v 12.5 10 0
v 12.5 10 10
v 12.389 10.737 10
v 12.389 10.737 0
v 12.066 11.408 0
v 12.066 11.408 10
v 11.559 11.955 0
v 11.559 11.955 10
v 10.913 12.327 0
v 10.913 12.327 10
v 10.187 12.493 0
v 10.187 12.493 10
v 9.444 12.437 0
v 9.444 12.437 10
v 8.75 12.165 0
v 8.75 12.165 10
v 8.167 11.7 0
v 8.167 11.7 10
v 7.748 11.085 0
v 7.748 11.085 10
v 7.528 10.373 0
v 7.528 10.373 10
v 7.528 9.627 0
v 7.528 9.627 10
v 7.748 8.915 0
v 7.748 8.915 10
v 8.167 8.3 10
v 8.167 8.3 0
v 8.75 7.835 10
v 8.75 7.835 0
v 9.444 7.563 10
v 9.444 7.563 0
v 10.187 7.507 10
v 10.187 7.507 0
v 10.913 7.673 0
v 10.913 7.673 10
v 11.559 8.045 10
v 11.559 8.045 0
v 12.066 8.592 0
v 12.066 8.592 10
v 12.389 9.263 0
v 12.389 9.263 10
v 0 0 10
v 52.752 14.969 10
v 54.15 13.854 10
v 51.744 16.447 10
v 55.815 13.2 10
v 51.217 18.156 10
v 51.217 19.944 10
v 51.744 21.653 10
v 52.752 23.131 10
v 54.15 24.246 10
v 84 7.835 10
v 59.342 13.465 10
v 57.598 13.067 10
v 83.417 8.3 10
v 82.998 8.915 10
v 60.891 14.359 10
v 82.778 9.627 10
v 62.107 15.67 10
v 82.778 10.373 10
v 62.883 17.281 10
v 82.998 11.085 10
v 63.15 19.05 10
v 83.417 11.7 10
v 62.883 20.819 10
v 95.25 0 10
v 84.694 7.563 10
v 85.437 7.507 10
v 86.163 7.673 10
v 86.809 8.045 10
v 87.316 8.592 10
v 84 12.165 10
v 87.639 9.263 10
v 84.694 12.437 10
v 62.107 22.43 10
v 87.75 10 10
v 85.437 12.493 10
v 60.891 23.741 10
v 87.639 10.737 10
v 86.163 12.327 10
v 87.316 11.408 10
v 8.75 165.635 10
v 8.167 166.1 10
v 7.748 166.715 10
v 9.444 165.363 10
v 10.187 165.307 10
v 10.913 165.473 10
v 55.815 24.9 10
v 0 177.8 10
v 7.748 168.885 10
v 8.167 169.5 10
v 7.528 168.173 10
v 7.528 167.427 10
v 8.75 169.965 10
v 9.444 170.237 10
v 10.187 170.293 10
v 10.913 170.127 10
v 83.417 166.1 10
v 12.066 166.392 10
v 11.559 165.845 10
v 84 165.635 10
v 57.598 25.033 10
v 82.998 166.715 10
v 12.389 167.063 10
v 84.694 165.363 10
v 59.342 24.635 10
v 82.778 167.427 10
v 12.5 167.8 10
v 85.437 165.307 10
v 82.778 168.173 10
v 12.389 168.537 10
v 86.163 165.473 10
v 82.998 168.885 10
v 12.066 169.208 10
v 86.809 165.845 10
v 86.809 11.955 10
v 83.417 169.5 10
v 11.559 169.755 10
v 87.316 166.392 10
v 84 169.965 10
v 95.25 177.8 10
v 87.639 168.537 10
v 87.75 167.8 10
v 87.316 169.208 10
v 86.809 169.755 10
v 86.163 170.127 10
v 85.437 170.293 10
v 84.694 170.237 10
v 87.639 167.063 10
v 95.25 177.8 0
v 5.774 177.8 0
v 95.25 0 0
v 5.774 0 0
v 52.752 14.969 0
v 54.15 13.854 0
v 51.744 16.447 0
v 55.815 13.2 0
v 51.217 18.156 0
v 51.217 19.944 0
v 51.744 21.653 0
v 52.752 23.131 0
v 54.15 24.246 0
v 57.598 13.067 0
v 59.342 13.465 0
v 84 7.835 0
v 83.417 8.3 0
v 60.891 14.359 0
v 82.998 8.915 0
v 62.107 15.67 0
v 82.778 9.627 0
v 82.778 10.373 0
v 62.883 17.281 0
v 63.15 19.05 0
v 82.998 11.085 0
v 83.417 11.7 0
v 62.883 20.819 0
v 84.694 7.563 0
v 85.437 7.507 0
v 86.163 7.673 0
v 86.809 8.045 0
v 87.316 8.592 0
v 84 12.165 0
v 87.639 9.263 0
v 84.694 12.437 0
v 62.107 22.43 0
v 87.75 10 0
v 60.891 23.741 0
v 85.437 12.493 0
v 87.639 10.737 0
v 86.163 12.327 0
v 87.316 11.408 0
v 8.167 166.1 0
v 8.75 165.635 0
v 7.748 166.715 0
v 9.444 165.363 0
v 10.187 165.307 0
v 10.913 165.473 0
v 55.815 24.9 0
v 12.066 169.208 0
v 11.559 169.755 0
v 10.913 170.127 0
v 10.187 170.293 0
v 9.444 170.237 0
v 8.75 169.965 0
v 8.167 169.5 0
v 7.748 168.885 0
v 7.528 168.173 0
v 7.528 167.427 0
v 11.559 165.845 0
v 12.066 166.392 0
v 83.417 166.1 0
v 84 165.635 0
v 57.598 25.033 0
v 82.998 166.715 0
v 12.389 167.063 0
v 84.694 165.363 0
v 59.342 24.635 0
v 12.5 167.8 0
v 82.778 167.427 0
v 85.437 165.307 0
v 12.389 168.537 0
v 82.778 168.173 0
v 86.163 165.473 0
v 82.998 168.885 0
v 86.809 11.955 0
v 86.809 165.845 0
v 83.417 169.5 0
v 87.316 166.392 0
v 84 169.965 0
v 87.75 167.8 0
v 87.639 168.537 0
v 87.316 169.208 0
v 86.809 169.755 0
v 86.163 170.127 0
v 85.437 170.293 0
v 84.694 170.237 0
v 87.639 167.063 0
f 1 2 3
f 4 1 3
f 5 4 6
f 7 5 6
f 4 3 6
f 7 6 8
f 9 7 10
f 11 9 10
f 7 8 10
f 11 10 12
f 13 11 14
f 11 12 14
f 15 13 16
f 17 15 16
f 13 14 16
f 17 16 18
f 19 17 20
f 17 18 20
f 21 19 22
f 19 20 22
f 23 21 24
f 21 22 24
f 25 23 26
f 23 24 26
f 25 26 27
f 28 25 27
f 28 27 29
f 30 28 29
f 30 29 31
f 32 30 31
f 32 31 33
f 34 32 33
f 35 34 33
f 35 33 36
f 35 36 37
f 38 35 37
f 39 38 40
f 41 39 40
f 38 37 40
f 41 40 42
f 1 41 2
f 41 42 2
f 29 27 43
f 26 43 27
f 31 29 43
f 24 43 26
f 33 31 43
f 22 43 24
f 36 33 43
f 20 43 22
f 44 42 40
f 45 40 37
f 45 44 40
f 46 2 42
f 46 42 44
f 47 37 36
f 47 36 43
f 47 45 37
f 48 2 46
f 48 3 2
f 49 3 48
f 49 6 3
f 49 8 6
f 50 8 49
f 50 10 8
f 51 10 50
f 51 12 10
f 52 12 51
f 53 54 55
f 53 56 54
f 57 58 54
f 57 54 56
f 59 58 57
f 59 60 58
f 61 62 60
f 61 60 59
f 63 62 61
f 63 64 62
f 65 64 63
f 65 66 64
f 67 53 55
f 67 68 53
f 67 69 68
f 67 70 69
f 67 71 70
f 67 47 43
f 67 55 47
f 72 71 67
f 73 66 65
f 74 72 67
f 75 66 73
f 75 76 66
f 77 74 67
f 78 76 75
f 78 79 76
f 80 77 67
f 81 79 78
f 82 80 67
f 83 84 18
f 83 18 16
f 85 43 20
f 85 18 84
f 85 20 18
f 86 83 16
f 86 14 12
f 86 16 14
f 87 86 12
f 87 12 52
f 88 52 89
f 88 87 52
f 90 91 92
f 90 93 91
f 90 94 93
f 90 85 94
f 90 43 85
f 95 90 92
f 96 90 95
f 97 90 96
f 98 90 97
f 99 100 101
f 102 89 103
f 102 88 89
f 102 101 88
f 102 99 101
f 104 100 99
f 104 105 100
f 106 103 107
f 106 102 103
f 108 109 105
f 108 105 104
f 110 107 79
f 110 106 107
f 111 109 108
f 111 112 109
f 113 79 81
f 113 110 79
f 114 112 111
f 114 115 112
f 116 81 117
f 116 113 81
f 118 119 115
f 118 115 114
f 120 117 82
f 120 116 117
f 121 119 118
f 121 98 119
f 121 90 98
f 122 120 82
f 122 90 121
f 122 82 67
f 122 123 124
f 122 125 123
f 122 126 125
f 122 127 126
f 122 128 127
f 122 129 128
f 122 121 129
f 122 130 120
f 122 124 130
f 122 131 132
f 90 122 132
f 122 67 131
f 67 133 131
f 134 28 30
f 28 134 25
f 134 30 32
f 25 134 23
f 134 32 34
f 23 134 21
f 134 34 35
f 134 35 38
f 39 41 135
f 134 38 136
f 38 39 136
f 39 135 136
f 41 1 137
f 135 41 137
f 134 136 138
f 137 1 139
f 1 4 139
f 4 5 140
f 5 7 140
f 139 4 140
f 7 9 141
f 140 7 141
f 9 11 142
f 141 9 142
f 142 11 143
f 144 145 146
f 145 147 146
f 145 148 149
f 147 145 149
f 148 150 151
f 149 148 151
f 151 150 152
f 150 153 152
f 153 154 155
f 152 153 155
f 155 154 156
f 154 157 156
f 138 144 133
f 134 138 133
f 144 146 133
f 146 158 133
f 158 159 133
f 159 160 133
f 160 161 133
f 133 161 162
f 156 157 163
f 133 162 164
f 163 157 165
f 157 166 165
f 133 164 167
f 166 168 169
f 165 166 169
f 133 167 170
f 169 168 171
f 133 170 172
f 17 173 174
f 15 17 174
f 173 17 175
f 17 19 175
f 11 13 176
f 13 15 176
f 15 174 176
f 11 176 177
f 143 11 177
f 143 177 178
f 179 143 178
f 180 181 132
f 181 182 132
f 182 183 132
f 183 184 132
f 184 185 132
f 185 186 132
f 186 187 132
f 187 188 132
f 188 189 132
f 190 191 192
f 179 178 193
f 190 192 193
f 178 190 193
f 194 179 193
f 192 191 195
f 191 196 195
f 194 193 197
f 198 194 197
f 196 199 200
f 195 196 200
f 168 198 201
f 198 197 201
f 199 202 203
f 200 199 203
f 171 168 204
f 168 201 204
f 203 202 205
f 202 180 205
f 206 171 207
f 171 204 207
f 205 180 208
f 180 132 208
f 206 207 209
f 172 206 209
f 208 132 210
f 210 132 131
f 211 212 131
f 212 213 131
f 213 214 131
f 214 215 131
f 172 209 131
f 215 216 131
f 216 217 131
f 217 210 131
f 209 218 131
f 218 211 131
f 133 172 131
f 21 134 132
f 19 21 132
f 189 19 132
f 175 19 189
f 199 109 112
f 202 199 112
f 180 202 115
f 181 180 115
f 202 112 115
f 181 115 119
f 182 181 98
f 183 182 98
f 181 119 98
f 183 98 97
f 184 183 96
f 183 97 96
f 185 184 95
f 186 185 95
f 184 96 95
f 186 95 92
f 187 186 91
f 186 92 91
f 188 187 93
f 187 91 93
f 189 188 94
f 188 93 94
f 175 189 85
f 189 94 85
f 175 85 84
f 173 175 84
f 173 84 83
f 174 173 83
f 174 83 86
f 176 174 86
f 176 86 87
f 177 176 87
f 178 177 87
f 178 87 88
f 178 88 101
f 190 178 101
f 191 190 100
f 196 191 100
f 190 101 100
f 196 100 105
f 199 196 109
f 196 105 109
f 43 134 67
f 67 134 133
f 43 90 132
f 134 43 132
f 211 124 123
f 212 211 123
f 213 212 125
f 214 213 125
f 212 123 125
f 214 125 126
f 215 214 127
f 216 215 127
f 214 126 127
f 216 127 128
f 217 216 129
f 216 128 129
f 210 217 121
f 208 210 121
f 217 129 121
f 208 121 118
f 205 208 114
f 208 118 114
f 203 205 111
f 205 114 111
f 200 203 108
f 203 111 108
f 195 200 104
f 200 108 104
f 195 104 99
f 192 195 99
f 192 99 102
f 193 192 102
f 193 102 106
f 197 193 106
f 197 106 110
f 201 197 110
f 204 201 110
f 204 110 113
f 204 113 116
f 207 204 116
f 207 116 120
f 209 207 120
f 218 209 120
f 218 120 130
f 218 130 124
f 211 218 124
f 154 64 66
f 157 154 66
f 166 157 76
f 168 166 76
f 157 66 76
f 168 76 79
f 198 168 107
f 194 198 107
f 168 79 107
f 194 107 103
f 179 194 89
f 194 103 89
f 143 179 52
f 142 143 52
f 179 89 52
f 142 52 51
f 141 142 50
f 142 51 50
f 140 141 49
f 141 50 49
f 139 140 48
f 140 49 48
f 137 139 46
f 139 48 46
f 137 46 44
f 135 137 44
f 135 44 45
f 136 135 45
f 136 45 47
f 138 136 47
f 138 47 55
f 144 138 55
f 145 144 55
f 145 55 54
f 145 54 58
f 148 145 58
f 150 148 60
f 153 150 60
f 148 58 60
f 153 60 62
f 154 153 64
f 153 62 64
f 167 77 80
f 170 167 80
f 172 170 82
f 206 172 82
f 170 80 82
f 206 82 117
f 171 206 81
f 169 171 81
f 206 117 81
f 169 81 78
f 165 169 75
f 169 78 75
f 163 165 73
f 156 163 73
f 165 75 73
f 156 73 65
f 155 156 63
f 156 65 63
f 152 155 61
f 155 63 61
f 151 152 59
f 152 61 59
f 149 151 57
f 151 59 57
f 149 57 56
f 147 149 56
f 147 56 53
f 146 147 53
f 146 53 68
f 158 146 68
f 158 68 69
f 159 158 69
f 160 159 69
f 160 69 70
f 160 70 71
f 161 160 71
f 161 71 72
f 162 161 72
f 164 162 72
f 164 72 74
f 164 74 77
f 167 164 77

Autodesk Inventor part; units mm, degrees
ref_plane "YZ Plane" through (0, 0, 0) normal (1, 0, 0) x (0, 1, 0)
ref_plane "XZ Plane" through (0, 0, 0) normal (0, 1, 0) x (-1, 0, 0)
ref_plane "XY Plane" through (0, 0, 0) normal (0, 0, 1) x (1, 0, 0)
sketch "Sketch1" plane through (0, 0, 0) normal (0, 0, 1) x (1, 0, 0)
  line L0 (0, 0) -> (95.25, 0)
  line L1 (95.25, 0) -> (95.25, 177.8)
  line L2 (95.25, 177.8) -> (0, 177.8)
  line L3 (0, 177.8) -> (0, 0)
  dimension "d0" = 95.25
  dimension "d1" = 177.8
extrude "Extrusion1" add sketch "Sketch1" along normal blind 10
sketch "Sketch2" plane through (0, 177.8, 0) normal (0, 1, 0) x (1, 0, 0)
  line L0 (0, -10) -> (95.25, -10) projected
  line L1 (0, -10) -> (5.7735, 0)
  line L2 (0, 0) -> (95.25, 0) projected
  line L3 (0, 0) -> (0, -10)
  line L4 (5.7735, 0) -> (0, 0)
  dimension "d4" = 30
extrude "Extrusion2" cut sketch "Sketch2" against normal through all
sketch "Sketch3" plane through (0, 0, 10) normal (0, 0, 1) x (1, 0, 0)
  line L0 (0, 0) -> (95.25, 0) construction
  line L1 (95.25, 0) -> (95.25, 177.8) construction
  line L2 (95.25, 177.8) -> (0, 177.8) construction
  line L3 (0, 177.8) -> (0, 0) construction
  line L4 (10, 10) -> (85.25, 10) construction
  line L5 (85.25, 10) -> (85.25, 167.8) construction
  line L6 (85.25, 167.8) -> (10, 167.8) construction
  line L7 (10, 167.8) -> (10, 10) construction
  circle A0 centre (10, 167.8) radius 2.5
  circle A1 centre (85.25, 167.8) radius 2.5
  circle A2 centre (85.25, 10) radius 2.5
  circle A3 centre (10, 10) radius 2.5
  dimension "d7" = 10
  dimension "d8" = 5
  dimension "d9" = 5
  dimension "d10" = 5
  dimension "d11" = 5
extrude "Extrusion3" cut sketch "Sketch3" against normal through all
sketch "Sketch4" plane through (0, 0, 10) normal (0, 0, 1) x (1, 0, 0)
  circle A0 centre (57.15, 19.05) radius 6
  line L0 (95.25, 177.8) -> (0, 177.8) projected
  line L1 (95.25, 0) -> (95.25, 177.8) projected
  line L2 (0, 0) -> (95.25, 0) projected
  dimension "d14" = 12
  dimension "d16" = 38.1
  dimension "d19" = 19.05
extrude "Extrusion4" cut sketch "Sketch4" against normal through all
properties part number "BA09" material "ABS Plastic"
